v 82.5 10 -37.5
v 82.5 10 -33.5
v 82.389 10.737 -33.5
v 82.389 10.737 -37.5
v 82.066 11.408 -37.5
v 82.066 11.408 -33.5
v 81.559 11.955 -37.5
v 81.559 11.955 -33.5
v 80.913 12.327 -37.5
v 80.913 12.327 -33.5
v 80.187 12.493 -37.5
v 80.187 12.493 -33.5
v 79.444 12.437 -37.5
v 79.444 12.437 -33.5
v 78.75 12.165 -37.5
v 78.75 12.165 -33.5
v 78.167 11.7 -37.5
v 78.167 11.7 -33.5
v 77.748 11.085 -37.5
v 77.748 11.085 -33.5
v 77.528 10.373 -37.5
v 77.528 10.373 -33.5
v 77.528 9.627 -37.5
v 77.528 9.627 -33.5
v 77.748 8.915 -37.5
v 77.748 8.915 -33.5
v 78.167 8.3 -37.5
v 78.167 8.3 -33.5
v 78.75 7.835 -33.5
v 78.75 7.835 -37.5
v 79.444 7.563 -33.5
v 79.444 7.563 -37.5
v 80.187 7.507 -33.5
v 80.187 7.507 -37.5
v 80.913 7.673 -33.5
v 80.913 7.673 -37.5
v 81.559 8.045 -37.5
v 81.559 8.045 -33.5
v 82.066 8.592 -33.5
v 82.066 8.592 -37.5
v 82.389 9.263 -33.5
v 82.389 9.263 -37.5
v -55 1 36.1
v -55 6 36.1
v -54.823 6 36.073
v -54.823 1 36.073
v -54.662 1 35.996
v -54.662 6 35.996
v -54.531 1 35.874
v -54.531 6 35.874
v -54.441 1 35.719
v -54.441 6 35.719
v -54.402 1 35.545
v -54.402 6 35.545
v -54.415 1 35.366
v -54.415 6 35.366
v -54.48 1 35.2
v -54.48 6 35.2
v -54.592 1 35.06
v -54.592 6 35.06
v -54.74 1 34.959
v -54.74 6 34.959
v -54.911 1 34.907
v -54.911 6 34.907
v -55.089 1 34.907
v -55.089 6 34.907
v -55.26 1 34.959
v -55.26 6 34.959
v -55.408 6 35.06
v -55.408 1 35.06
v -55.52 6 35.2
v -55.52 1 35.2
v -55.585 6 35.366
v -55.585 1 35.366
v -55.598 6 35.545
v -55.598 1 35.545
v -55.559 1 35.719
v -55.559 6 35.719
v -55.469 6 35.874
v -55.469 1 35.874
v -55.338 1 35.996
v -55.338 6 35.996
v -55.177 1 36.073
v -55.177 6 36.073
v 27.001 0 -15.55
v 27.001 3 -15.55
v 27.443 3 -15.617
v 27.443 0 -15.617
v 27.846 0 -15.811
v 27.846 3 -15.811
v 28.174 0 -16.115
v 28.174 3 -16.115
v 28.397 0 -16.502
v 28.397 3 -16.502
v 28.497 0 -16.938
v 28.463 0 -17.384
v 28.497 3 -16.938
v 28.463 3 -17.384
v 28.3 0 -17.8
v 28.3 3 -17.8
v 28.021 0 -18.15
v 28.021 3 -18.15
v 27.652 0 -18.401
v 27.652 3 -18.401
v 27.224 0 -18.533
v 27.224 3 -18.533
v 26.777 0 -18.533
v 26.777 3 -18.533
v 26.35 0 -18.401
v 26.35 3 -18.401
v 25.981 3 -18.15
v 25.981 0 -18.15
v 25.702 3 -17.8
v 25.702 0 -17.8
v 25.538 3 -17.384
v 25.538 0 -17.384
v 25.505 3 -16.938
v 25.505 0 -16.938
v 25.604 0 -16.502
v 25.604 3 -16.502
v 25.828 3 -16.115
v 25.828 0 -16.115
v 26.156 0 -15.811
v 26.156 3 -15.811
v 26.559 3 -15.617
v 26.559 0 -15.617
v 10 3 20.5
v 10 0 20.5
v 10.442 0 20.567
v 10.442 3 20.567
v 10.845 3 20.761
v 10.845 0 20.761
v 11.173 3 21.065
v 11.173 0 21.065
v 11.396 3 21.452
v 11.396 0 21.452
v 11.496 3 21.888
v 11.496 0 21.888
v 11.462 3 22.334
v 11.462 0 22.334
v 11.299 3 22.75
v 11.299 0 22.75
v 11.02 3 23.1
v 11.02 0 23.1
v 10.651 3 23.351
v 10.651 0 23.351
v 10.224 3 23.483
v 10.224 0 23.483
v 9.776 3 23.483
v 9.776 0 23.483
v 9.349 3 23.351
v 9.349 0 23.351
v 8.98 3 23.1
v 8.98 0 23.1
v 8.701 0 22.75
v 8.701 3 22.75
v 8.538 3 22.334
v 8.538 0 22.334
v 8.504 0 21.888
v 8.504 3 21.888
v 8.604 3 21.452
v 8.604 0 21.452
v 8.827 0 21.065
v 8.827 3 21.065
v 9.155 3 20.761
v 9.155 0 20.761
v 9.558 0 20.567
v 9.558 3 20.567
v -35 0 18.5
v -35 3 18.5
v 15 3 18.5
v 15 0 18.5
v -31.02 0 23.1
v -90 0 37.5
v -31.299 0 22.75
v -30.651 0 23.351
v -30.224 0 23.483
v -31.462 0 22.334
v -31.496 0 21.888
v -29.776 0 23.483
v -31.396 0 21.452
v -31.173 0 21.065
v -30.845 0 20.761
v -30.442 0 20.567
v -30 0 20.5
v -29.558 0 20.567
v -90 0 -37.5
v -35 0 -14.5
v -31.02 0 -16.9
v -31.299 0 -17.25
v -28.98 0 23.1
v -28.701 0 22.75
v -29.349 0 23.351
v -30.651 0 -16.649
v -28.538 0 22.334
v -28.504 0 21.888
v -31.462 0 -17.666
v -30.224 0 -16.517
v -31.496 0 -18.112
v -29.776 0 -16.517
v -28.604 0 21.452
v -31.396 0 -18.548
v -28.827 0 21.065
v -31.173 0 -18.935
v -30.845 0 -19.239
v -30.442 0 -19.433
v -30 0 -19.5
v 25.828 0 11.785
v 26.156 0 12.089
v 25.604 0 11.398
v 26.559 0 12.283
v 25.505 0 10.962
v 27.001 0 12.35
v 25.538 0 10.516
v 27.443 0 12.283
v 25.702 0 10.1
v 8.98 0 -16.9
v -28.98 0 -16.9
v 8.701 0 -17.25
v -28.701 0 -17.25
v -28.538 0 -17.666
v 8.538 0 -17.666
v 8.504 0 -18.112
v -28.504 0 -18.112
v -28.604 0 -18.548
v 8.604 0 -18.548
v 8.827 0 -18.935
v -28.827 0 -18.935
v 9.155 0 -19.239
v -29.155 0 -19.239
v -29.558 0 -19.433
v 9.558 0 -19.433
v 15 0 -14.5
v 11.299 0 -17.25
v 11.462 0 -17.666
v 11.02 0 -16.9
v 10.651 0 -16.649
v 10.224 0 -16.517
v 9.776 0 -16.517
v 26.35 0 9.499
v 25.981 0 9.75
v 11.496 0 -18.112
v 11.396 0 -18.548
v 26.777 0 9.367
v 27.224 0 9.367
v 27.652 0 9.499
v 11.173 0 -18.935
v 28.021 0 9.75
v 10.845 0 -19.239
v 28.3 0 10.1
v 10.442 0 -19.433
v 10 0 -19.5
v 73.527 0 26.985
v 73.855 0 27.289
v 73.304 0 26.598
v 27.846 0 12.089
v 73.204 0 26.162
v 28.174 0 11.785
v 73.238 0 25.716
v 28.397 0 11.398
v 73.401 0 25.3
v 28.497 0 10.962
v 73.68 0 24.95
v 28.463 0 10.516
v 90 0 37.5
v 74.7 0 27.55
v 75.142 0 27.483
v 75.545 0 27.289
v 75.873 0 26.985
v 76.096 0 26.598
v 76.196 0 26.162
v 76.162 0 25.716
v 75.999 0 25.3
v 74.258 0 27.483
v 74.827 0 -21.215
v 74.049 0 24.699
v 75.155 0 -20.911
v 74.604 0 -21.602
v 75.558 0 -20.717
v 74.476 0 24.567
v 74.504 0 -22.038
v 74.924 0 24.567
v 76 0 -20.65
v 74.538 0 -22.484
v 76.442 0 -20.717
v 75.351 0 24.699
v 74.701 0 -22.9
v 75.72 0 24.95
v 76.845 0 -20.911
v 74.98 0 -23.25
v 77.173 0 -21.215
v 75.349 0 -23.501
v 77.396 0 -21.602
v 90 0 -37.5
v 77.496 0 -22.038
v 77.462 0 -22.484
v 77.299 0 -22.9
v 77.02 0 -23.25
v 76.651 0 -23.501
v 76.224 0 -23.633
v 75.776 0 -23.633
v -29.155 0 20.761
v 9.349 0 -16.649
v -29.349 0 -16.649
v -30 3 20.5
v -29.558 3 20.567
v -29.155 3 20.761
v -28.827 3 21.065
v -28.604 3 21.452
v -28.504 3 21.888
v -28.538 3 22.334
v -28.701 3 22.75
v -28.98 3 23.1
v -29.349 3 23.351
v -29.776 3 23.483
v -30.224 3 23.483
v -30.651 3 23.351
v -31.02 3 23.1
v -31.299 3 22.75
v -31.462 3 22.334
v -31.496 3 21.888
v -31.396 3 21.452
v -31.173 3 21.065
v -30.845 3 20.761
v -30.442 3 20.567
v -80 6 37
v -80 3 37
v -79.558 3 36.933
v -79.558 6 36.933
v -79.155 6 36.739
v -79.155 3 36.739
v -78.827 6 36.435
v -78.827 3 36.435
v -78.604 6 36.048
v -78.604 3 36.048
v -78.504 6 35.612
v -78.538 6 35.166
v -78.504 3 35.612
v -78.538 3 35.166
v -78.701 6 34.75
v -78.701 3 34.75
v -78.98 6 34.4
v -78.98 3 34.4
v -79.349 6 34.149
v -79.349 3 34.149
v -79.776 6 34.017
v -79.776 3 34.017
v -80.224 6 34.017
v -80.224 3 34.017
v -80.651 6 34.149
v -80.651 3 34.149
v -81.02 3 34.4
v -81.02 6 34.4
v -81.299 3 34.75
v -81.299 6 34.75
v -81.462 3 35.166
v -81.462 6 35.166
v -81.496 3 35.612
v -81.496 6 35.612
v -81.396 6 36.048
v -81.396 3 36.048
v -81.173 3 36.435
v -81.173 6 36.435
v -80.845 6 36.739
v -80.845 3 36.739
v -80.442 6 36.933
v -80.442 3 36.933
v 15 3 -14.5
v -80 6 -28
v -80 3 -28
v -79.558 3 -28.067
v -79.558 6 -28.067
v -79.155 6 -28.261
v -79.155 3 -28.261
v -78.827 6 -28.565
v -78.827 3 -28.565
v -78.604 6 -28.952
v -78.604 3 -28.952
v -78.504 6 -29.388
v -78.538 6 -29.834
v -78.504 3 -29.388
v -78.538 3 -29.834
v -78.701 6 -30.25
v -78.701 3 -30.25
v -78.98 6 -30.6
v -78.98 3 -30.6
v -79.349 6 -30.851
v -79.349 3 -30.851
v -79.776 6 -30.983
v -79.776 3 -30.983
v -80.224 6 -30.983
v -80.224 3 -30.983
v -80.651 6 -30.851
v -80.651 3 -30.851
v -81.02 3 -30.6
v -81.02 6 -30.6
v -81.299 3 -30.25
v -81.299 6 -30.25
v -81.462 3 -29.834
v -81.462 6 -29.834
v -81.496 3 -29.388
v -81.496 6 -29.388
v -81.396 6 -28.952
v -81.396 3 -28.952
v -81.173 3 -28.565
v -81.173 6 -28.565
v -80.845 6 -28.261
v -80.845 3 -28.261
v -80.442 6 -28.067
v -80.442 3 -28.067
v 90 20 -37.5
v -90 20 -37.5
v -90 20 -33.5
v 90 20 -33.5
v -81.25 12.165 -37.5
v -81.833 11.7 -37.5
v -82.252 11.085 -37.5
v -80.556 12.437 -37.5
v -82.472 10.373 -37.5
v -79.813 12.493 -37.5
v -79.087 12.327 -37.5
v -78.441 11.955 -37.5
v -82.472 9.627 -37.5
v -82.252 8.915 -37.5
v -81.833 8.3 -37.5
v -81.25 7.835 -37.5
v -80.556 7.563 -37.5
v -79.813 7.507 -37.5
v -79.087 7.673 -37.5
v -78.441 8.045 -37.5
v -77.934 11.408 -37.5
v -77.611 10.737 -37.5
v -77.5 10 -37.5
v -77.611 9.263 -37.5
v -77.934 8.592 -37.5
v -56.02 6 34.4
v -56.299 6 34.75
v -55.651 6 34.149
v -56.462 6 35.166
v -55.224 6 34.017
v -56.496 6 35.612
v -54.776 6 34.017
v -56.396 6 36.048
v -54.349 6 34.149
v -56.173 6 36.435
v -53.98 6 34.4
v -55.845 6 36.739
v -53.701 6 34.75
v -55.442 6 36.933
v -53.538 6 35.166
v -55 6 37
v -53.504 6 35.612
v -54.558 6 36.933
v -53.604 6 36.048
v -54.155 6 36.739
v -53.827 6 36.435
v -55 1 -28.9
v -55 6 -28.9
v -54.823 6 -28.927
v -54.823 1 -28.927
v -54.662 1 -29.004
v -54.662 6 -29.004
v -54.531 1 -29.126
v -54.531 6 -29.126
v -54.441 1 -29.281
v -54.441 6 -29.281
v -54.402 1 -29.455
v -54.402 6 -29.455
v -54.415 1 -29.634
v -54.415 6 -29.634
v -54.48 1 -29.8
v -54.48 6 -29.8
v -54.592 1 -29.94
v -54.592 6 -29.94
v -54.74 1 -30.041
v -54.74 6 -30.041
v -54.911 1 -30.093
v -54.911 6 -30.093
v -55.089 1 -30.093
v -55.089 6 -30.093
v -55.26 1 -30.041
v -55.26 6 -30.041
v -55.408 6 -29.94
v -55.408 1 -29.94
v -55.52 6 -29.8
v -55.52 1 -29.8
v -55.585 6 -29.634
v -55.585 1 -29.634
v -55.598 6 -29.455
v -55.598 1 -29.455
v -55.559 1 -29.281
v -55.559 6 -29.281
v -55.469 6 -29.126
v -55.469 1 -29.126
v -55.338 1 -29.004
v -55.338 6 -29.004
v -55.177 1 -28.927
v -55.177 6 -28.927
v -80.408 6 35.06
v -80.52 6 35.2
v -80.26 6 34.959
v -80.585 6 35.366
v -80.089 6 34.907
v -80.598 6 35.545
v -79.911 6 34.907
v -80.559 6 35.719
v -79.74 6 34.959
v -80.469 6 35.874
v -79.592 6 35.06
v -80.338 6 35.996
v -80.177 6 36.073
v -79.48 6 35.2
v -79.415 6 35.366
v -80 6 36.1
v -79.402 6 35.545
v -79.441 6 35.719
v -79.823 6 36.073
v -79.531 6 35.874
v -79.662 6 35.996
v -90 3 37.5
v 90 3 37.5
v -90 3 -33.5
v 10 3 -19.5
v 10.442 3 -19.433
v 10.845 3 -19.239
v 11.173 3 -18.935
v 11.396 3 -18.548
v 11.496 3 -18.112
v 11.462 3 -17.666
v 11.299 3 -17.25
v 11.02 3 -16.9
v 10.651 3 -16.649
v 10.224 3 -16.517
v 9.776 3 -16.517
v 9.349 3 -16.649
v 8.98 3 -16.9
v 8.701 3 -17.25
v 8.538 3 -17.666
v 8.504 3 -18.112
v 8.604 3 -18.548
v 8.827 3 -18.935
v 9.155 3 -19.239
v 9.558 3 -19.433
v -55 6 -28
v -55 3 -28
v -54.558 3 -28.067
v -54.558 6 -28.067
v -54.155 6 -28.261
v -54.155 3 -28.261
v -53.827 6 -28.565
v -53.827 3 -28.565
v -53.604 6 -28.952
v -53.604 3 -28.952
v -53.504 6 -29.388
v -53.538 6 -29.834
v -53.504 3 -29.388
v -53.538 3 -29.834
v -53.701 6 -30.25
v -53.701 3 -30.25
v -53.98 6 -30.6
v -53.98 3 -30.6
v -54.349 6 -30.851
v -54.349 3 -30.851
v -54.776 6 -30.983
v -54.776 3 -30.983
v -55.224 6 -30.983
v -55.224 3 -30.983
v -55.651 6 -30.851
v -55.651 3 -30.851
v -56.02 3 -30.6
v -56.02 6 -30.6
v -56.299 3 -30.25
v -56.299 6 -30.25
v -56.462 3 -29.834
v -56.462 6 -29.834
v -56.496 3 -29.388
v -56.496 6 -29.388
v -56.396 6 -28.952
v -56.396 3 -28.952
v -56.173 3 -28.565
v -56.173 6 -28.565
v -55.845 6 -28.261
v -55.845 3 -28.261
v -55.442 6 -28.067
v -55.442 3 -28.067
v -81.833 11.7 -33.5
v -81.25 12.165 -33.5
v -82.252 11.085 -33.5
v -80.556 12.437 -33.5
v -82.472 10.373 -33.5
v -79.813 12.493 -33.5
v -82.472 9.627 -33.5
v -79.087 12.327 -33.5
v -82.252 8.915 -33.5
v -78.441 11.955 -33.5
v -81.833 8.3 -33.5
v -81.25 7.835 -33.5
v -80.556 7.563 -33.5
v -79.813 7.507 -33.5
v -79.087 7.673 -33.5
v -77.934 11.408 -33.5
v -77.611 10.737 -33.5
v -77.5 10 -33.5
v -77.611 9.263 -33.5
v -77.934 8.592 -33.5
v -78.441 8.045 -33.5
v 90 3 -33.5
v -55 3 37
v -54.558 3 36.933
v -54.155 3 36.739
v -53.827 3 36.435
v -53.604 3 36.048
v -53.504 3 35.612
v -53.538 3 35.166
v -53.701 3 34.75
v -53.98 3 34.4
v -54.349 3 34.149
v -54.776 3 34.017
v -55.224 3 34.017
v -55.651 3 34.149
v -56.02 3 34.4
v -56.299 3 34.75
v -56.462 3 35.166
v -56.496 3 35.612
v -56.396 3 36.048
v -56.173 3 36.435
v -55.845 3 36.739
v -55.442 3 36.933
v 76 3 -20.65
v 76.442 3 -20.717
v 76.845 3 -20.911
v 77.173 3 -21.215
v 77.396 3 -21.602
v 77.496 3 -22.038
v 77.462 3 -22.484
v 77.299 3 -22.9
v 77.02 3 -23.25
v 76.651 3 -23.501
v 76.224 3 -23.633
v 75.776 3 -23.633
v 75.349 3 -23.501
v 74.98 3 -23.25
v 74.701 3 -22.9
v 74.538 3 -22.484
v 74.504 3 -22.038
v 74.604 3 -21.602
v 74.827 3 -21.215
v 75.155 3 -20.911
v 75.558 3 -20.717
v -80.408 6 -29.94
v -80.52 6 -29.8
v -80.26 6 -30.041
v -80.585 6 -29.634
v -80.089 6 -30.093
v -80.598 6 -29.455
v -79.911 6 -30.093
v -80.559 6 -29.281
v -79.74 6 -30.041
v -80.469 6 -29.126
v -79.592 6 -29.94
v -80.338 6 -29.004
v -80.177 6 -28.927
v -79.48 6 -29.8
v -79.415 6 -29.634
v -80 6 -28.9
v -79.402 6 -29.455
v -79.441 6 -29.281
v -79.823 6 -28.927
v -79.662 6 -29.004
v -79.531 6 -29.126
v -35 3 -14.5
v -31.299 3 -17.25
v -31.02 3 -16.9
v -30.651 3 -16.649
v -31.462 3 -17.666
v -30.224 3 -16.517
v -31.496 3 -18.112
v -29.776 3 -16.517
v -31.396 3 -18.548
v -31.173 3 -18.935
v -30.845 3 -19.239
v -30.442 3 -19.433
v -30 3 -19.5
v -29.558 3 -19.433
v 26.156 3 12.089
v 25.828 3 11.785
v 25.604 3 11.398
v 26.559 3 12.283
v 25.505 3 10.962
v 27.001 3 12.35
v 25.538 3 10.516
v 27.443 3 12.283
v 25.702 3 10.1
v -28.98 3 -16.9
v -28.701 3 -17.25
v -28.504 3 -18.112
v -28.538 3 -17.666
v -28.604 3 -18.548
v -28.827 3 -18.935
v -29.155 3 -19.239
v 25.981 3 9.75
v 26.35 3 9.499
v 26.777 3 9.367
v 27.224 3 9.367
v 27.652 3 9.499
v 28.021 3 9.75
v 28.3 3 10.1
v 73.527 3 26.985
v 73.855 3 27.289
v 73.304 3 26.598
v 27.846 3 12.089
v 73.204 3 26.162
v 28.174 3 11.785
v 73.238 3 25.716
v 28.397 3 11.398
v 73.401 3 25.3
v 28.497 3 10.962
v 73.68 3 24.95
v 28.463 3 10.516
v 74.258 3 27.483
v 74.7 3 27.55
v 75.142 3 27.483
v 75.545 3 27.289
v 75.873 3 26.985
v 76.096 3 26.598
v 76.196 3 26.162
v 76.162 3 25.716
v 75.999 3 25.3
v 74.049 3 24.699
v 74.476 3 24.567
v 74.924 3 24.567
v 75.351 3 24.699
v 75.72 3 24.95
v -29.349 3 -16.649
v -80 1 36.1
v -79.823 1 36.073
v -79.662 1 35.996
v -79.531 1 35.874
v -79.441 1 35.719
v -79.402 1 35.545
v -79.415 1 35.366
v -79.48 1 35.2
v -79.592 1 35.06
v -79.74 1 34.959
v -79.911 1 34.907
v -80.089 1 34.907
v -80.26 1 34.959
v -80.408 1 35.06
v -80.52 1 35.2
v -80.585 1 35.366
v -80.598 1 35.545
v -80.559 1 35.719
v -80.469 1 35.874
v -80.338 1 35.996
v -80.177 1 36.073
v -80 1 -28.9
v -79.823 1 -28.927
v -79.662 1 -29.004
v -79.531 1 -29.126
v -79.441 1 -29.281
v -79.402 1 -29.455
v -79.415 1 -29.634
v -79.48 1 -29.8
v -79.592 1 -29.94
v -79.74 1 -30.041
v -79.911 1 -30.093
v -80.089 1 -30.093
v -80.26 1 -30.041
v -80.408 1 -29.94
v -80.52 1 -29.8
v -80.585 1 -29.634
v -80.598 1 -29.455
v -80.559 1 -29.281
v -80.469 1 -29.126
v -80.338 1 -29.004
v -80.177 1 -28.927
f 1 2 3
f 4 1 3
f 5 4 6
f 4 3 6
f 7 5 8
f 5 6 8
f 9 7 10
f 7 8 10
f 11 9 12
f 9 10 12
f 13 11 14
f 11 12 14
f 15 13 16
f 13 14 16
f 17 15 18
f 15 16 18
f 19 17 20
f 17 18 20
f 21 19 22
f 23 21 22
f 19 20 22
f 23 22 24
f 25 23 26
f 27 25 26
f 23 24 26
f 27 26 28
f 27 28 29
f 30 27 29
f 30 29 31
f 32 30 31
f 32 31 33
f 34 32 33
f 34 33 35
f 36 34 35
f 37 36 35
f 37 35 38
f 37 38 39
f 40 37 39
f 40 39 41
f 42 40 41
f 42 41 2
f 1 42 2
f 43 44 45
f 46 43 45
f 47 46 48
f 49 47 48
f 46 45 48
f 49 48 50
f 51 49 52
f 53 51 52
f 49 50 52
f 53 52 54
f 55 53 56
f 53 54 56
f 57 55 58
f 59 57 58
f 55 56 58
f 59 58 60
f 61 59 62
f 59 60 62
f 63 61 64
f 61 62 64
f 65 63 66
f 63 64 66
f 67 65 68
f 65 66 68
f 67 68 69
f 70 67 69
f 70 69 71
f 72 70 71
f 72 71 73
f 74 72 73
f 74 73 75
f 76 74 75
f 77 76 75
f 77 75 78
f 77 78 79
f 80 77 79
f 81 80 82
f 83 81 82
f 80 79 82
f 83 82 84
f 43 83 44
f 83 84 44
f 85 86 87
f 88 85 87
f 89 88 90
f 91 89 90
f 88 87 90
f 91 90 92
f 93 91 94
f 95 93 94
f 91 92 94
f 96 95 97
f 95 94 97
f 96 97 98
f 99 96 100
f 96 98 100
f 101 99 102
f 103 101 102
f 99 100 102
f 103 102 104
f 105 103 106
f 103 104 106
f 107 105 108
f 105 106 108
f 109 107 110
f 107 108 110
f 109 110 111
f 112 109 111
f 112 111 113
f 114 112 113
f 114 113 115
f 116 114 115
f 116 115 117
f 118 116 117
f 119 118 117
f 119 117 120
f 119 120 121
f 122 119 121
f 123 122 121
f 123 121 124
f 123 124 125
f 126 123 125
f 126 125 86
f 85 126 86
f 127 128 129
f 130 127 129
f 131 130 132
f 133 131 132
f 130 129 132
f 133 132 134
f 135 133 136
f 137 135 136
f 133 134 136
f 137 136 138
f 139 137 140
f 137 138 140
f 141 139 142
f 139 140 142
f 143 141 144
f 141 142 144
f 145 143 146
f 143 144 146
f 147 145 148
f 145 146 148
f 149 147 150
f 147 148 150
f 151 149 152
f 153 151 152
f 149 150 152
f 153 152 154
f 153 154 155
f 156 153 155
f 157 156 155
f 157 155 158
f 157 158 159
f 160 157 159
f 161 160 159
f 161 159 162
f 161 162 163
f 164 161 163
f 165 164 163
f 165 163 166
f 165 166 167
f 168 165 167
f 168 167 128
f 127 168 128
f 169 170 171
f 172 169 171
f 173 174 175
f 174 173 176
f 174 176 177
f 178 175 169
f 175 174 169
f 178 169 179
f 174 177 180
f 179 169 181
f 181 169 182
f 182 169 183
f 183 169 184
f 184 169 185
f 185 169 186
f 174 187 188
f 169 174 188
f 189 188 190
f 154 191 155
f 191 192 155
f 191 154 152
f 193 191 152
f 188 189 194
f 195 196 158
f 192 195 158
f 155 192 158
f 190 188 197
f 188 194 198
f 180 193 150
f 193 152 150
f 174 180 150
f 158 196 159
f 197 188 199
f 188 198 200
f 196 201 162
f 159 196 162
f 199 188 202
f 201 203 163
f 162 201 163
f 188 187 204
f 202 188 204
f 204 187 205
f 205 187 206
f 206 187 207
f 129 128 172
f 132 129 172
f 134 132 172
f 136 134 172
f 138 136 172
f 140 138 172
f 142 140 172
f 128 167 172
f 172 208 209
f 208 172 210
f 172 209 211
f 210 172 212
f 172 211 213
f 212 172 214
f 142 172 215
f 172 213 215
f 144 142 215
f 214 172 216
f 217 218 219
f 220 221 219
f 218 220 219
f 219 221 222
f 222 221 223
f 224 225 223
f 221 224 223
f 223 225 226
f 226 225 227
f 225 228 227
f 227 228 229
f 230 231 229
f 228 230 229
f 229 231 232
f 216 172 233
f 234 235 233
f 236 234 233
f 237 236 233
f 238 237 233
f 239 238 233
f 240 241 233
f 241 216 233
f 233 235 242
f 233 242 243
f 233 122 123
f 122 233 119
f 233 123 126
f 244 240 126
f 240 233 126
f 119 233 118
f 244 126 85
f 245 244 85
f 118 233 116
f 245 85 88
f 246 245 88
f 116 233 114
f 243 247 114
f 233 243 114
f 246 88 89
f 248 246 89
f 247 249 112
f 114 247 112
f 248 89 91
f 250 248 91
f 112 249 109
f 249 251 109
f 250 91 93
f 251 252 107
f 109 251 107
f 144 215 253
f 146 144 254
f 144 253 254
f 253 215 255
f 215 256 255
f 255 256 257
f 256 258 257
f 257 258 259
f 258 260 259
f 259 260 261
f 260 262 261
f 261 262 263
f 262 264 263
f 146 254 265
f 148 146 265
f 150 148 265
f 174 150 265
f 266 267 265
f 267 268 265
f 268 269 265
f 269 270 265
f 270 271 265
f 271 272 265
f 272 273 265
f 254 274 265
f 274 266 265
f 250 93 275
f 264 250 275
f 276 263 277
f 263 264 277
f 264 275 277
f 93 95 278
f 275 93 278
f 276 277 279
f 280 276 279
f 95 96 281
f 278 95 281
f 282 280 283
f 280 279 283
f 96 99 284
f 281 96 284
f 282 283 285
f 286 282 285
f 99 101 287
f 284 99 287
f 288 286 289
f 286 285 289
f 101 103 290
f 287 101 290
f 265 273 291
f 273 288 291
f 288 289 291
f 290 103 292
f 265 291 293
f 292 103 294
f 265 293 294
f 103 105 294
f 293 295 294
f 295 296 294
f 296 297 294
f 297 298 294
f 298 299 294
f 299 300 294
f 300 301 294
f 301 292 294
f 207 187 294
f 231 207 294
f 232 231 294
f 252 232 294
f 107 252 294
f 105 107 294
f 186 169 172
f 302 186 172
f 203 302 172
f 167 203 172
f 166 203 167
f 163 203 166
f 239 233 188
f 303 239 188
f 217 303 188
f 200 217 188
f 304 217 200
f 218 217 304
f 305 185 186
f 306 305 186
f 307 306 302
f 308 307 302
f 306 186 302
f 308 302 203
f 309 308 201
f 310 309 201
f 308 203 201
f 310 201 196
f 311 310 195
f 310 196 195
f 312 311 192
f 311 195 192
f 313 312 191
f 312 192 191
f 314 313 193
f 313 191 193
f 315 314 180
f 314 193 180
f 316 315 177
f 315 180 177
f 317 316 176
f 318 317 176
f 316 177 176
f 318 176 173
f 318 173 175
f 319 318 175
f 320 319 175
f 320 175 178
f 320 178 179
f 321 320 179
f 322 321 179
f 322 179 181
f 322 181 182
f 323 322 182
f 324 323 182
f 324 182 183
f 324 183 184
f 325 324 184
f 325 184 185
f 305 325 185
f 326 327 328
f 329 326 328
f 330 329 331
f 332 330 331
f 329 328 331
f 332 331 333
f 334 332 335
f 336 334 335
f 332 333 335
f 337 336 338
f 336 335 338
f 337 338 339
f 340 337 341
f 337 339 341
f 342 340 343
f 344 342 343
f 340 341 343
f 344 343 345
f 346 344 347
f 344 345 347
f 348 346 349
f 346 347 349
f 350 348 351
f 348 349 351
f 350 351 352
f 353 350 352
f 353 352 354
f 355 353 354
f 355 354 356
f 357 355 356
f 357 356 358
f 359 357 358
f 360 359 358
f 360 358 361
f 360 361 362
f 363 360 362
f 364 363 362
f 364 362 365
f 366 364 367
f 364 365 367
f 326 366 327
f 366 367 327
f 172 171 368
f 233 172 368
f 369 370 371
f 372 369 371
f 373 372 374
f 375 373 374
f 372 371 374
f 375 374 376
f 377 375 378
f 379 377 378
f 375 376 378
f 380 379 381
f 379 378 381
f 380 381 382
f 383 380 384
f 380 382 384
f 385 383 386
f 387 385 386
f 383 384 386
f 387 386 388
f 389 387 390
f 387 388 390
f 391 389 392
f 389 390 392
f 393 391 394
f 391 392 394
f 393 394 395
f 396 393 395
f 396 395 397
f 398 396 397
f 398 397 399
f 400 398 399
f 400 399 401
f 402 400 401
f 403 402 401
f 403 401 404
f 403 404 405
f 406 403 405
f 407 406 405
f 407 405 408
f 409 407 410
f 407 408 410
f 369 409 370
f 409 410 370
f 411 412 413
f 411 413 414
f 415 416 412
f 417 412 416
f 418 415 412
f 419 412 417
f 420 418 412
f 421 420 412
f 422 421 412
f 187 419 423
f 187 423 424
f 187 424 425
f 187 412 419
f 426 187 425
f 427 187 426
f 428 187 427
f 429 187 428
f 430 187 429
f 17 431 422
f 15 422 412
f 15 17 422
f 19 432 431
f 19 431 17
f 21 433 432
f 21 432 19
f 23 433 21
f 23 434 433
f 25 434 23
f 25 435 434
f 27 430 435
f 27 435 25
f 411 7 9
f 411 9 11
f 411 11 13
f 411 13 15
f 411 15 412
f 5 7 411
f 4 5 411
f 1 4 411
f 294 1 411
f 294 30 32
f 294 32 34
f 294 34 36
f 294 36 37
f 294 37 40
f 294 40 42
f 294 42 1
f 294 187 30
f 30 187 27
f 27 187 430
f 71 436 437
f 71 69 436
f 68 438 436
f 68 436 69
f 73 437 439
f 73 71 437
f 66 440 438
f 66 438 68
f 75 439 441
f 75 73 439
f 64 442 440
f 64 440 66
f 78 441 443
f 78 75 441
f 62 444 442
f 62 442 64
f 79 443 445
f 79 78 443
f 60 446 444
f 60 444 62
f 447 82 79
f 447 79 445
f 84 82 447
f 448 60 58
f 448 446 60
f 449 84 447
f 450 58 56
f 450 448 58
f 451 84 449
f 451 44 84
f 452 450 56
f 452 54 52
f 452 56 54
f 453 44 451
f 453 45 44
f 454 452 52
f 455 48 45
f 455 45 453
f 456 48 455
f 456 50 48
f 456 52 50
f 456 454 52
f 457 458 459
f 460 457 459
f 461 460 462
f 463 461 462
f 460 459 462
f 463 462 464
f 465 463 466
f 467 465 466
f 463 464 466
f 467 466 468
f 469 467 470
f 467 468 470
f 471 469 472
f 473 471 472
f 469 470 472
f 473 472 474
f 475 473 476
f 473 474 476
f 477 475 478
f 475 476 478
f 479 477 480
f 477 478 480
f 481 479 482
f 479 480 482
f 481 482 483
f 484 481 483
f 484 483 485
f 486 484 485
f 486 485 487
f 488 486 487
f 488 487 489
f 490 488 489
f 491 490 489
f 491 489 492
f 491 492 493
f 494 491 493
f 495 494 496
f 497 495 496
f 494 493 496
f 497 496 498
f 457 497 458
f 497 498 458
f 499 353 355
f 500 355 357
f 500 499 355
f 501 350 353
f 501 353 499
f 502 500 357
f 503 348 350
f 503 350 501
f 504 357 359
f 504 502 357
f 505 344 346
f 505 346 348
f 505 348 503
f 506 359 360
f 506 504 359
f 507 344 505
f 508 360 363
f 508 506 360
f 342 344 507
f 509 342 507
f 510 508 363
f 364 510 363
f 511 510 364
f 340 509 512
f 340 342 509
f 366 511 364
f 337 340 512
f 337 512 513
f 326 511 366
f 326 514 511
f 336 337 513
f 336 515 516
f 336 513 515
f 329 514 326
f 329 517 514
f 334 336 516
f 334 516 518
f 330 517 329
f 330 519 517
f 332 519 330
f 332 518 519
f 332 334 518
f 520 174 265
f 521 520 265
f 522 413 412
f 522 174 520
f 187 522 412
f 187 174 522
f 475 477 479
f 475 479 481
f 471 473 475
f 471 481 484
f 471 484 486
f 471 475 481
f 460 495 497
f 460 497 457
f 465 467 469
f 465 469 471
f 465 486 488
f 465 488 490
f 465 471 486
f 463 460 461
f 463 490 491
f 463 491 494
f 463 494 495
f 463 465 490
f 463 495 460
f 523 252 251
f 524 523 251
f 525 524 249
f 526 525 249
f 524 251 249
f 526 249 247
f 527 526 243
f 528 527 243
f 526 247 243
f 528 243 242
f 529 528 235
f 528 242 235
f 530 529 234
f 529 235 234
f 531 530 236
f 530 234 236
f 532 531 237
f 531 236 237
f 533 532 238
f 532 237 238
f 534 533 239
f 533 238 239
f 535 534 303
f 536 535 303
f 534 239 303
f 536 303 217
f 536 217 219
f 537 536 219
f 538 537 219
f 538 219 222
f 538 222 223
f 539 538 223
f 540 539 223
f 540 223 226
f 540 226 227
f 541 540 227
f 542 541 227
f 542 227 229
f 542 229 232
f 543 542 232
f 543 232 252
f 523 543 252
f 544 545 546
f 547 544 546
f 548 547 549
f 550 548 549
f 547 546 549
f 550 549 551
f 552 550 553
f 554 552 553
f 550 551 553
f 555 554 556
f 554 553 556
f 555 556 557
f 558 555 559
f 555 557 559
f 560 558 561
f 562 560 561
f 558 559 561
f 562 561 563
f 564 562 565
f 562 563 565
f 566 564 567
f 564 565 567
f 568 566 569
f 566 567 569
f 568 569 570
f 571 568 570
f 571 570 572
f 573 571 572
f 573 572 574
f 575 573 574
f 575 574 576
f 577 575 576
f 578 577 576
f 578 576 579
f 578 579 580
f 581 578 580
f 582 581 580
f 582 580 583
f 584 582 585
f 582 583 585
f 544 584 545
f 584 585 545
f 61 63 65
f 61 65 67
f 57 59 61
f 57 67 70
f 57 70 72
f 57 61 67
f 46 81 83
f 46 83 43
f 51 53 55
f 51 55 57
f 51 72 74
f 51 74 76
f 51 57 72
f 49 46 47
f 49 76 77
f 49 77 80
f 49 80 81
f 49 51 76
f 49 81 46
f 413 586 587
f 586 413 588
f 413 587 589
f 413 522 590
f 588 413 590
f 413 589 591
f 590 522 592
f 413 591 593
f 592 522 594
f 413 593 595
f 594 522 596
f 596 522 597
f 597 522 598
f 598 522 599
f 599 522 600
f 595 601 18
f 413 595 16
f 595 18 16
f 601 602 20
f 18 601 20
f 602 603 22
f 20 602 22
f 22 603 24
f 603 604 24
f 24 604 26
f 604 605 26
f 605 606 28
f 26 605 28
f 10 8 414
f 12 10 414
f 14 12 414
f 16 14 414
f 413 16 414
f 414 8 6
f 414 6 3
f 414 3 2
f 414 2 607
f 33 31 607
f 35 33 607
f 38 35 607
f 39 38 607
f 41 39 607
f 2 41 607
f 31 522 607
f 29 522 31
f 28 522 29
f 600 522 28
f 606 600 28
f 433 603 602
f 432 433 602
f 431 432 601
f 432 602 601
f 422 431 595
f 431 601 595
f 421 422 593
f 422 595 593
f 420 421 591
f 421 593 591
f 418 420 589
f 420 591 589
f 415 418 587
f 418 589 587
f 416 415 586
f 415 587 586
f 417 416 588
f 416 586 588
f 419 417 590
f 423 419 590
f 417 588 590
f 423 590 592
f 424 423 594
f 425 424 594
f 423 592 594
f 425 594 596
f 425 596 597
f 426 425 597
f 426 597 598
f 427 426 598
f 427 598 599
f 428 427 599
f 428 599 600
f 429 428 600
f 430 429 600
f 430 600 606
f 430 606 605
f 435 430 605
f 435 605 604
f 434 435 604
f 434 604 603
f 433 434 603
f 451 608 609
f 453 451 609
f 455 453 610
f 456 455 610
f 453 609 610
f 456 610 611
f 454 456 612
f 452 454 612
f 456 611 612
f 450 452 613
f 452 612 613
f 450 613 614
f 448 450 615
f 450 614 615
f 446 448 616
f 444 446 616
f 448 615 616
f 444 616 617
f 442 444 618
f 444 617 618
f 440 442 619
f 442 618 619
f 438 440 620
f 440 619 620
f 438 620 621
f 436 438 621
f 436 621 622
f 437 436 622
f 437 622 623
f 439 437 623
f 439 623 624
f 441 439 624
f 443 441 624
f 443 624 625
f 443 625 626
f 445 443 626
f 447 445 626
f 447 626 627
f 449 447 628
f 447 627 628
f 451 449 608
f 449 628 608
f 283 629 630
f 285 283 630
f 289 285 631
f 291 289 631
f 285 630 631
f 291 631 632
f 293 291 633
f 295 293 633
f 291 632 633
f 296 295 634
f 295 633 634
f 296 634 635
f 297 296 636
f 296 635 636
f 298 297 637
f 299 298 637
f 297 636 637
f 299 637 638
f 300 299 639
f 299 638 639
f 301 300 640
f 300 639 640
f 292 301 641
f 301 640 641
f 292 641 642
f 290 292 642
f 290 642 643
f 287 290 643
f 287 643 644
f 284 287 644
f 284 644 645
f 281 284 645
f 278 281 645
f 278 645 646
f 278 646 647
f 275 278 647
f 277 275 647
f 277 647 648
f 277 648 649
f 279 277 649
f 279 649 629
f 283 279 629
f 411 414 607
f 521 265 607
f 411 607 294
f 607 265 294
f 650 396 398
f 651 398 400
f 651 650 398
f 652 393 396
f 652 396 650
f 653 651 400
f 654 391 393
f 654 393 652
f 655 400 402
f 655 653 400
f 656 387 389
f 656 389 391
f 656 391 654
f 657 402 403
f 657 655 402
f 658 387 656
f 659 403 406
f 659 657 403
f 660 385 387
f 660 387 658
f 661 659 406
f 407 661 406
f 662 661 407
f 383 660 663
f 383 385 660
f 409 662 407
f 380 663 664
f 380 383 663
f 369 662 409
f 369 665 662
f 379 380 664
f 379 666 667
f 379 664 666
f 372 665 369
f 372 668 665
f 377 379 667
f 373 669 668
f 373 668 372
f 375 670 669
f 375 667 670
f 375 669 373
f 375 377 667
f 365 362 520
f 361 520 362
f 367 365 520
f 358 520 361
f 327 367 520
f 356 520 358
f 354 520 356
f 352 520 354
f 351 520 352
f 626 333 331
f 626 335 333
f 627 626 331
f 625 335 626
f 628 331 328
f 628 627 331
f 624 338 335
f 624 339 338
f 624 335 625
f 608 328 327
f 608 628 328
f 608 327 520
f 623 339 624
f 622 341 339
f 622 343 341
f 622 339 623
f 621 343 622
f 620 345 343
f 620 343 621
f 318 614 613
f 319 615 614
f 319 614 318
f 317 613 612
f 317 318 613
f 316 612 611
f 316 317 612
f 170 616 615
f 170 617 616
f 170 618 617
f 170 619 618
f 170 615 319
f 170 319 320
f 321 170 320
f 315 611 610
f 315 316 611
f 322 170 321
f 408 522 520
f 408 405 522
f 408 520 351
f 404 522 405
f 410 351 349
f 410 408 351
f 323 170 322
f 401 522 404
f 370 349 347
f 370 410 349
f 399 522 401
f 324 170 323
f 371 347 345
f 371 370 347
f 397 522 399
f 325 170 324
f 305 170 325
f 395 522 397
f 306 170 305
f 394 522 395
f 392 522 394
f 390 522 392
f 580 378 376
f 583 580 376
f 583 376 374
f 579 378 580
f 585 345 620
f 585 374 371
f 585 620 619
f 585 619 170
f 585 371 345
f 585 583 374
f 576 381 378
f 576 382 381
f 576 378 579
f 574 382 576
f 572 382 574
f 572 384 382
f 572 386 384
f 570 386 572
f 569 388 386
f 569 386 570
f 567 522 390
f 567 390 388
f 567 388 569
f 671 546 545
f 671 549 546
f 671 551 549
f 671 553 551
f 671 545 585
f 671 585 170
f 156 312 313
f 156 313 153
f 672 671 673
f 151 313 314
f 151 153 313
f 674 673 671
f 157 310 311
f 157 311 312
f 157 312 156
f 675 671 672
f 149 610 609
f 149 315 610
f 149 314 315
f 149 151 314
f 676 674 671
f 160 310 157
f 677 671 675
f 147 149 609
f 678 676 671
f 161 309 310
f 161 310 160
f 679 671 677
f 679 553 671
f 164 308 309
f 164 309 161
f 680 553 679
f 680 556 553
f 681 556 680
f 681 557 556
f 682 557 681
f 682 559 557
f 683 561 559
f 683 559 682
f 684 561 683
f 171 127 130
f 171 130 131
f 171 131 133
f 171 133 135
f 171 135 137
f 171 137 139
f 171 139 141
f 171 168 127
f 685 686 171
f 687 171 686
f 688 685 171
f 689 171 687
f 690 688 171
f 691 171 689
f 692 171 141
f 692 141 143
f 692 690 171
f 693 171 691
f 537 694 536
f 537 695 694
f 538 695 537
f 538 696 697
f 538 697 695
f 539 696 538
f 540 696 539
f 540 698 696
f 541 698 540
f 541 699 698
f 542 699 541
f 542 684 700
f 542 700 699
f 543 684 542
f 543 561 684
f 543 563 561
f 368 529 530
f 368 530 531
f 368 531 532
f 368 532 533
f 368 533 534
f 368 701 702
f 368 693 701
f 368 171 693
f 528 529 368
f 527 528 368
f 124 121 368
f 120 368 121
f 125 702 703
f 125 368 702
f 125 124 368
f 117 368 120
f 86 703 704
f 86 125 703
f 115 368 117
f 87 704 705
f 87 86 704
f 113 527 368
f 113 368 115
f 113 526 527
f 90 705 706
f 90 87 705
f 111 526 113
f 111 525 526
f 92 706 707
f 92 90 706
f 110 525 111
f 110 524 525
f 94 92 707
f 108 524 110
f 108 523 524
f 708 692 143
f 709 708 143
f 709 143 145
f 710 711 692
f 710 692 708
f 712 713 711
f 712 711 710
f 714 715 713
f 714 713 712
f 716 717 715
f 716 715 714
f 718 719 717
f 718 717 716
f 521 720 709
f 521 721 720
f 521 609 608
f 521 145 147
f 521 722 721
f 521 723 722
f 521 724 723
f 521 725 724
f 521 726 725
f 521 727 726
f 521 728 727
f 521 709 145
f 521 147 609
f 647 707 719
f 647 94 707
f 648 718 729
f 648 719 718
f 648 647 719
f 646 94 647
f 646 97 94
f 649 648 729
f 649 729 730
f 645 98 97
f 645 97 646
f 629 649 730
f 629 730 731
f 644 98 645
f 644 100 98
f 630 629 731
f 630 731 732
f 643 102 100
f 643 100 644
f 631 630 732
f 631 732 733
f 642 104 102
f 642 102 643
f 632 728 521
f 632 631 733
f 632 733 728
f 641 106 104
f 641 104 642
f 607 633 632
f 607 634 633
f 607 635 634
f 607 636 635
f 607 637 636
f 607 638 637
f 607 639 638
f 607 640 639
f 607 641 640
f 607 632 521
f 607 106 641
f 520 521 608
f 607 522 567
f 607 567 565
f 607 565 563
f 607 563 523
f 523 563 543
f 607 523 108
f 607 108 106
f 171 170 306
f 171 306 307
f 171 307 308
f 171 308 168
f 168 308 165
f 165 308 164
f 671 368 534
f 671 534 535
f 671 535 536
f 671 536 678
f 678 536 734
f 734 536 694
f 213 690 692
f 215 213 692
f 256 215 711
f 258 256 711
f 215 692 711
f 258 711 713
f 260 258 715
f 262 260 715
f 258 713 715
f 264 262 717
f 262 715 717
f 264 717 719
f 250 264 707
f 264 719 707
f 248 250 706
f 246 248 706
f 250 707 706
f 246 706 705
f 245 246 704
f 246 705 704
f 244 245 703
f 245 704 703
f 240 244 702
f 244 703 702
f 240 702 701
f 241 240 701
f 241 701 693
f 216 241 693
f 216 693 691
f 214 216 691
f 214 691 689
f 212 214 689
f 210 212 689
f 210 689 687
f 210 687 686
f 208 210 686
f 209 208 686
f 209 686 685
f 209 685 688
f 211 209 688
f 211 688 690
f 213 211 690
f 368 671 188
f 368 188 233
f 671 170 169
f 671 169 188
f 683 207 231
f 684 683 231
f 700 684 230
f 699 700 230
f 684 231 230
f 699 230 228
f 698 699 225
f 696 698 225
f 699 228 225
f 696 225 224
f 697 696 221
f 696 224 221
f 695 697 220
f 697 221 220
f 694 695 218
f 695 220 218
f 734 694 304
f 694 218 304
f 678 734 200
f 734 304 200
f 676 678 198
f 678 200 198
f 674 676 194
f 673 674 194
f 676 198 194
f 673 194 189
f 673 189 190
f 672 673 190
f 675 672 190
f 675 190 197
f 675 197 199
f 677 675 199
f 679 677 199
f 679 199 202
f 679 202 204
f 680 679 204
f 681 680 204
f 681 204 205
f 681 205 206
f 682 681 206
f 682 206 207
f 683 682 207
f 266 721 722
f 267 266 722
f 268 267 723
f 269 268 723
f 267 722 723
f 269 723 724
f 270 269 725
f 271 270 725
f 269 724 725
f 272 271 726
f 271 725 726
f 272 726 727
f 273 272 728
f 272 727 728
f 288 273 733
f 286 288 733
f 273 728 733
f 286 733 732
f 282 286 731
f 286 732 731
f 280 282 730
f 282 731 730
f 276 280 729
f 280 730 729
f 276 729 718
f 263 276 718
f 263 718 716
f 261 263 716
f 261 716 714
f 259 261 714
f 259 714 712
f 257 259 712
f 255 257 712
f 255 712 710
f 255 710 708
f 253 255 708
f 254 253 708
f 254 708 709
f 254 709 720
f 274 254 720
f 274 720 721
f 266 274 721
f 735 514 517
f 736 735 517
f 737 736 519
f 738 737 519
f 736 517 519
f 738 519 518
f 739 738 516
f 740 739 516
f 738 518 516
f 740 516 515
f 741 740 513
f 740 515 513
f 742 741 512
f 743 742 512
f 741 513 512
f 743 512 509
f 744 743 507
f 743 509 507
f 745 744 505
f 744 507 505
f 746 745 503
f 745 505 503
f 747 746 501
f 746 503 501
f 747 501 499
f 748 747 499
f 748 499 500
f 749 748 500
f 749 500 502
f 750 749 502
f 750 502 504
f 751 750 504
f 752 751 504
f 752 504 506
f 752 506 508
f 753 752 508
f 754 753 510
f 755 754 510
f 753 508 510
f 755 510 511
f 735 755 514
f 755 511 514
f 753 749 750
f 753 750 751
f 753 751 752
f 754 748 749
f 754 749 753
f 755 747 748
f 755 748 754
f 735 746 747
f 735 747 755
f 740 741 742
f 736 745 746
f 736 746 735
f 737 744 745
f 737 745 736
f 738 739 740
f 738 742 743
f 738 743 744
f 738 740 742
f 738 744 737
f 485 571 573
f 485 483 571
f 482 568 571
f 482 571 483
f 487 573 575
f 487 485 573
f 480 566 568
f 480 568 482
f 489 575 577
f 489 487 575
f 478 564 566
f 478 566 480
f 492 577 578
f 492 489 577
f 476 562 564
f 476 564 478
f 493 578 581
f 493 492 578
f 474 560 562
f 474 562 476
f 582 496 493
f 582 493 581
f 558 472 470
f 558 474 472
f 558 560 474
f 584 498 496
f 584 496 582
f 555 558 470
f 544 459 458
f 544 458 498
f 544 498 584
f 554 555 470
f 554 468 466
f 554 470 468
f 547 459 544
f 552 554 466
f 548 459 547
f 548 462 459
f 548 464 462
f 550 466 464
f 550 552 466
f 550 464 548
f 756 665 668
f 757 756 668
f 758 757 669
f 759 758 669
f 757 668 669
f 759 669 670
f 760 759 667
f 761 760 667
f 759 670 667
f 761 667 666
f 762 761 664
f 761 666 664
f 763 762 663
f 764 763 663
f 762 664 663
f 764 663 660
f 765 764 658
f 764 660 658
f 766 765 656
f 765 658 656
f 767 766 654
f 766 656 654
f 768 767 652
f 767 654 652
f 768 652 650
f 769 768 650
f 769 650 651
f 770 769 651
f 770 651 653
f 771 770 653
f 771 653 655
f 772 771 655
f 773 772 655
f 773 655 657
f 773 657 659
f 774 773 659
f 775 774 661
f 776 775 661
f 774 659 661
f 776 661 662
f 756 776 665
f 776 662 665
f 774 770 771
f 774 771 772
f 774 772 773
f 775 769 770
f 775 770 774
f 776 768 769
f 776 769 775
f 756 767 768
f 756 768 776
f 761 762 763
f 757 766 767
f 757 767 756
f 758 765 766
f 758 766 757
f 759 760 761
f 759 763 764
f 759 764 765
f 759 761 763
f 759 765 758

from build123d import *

# Parameters (mm, degrees)
SKETCH1_W             = 180
SKETCH1_H             = 75
BOSS_EXTRUDE1_DEPTH   = 3
SKETCH2_W             = 180
SKETCH2_H             = 4
BOSS_EXTRUDE2_DEPTH   = 17
SKETCH3_R             = 1.5
BOSS_EXTRUDE3_DEPTH   = 3
SKETCH4_R             = 0.6
CUT_EXTRUDE1_DEPTH    = 5
SKETCH5_W             = 50
SKETCH5_H             = 33
CUT_EXTRUDE2_DEPTH    = 5
F_3_0MM_DOWEL_HOLE1_D = 3
CUT_EXTRUDE3_REACH    = 100.971
SKETCH8_R             = 1.5
CUT_EXTRUDE4_REACH    = 118.366
SKETCH9_R             = 2.5


with BuildPart() as part:
    # Sketch1 → Boss-Extrude1 (new body)
    with BuildSketch(Plane(origin=(0, 0, 0), x_dir=(1, 0, 0), z_dir=(0, 1, 0))):
        Rectangle(SKETCH1_W, SKETCH1_H)
    extrude(amount=BOSS_EXTRUDE1_DEPTH)

    # Sketch2 → Boss-Extrude2 (add)
    with BuildSketch(Plane(origin=(0, 3, 0), x_dir=(1, 0, 0), z_dir=(0, 1, 0))):
        with Locations((0, 35.5)):
            Rectangle(SKETCH2_W, SKETCH2_H)
    extrude(amount=BOSS_EXTRUDE2_DEPTH)

    # Sketch3 → Boss-Extrude3 (add)
    with BuildSketch(Plane(origin=(0, 3, 0), x_dir=(1, 0, 0), z_dir=(0, 1, 0))):
        with Locations(Location((-80, 29.5, 0), (0, 0, 270))):
            Circle(SKETCH3_R)
        with Locations(Location((-55, 29.5, 0), (0, 0, 270))):
            Circle(SKETCH3_R)
        with Locations(Location((-55, -35.5, 0), (0, 0, 270))):
            Circle(SKETCH3_R)
        with Locations(Location((-80, -35.5, 0), (0, 0, 270))):
            Circle(SKETCH3_R)
    extrude(amount=BOSS_EXTRUDE3_DEPTH)

    # Sketch4 → Cut-Extrude1 (cut)
    with BuildSketch(Plane(origin=(0, 6, 0), x_dir=(1, 0, 0), z_dir=(0, 1, 0))):
        with Locations(Location((-80, 29.5, 0), (0, 0, 270))):
            Circle(SKETCH4_R)
        with Locations(Location((-55, 29.5, 0), (0, 0, 270))):
            Circle(SKETCH4_R)
        with Locations(Location((-55, -35.5, 0), (0, 0, 270))):
            Circle(SKETCH4_R)
        with Locations(Location((-80, -35.5, 0), (0, 0, 270))):
            Circle(SKETCH4_R)
    extrude(amount=-CUT_EXTRUDE1_DEPTH, mode=Mode.SUBTRACT)

    # Sketch5 → Cut-Extrude2 (cut)
    with BuildSketch(Plane(origin=(0, 3, 0), x_dir=(1, 0, 0), z_dir=(0, 1, 0))):
        with Locations((-10, -2)):
            Rectangle(SKETCH5_W, SKETCH5_H)
    extrude(amount=-CUT_EXTRUDE2_DEPTH, mode=Mode.SUBTRACT)

    # Ø3.0mm Dowel Hole1 (through all)
    with Locations(Plane(origin=(-30, 3, -18), x_dir=(0, 0, 1), z_dir=(0, 1, 0))):
        with Locations((0, 0), (0, 40), (40, 40), (40, 0)):
            Hole(F_3_0MM_DOWEL_HOLE1_D / 2)

    # Sketch8 → Cut-Extrude3 (cut, up to next)
    with BuildSketch(Plane(origin=(0, 3, 0), x_dir=(1, 0, 0), z_dir=(0, 1, 0)), mode=Mode.PRIVATE) as cut_extrude3_sk1:
        with Locations(Location((76, 22.15, 0), (0, 0, 270))):
            Circle(SKETCH8_R)
    cut_extrude3_tool1 = extrude(cut_extrude3_sk1.sketch, amount=-CUT_EXTRUDE3_REACH, mode=Mode.PRIVATE) & part.part
    # Sketch8 → Cut-Extrude3 (cut, up to next)
    with BuildSketch(Plane(origin=(0, 3, 0), x_dir=(1, 0, 0), z_dir=(0, 1, 0)), mode=Mode.PRIVATE) as cut_extrude3_sk2:
        with Locations(Location((74.7, -26.05, 0), (0, 0, 270))):
            Circle(SKETCH8_R)
    cut_extrude3_tool2 = extrude(cut_extrude3_sk2.sketch, amount=-CUT_EXTRUDE3_REACH, mode=Mode.PRIVATE) & part.part
    # Sketch8 → Cut-Extrude3 (cut, up to next)
    with BuildSketch(Plane(origin=(0, 3, 0), x_dir=(1, 0, 0), z_dir=(0, 1, 0)), mode=Mode.PRIVATE) as cut_extrude3_sk3:
        with Locations(Location((27.000808713, -10.85, 0), (0, 0, 270))):
            Circle(SKETCH8_R)
    cut_extrude3_tool3 = extrude(cut_extrude3_sk3.sketch, amount=-CUT_EXTRUDE3_REACH, mode=Mode.PRIVATE) & part.part
    # Sketch8 → Cut-Extrude3 (cut, up to next)
    with BuildSketch(Plane(origin=(0, 3, 0), x_dir=(1, 0, 0), z_dir=(0, 1, 0)), mode=Mode.PRIVATE) as cut_extrude3_sk4:
        with Locations(Location((27.000808713, 17.05, 0), (0, 0, 270))):
            Circle(SKETCH8_R)
    cut_extrude3_tool4 = extrude(cut_extrude3_sk4.sketch, amount=-CUT_EXTRUDE3_REACH, mode=Mode.PRIVATE) & part.part
    add(cut_extrude3_tool1.solids().sort_by_distance((76, 3, -22.15))[0], mode=Mode.SUBTRACT)
    add(cut_extrude3_tool2.solids().sort_by_distance((74.7, 3, 26.05))[0], mode=Mode.SUBTRACT)
    add(cut_extrude3_tool3.solids().sort_by_distance((27.000809, 3, 10.85))[0], mode=Mode.SUBTRACT)
    add(cut_extrude3_tool4.solids().sort_by_distance((27.000809, 3, -17.05))[0], mode=Mode.SUBTRACT)

    # Sketch9 → Cut-Extrude4 (cut, up to next)
    with BuildSketch(Plane.XY.offset(-33.5), mode=Mode.PRIVATE) as cut_extrude4_sk1:
        with Locations((-80, 10)):
            Circle(SKETCH9_R)
    cut_extrude4_tool1 = extrude(cut_extrude4_sk1.sketch, amount=-CUT_EXTRUDE4_REACH, mode=Mode.PRIVATE) & part.part
    # Sketch9 → Cut-Extrude4 (cut, up to next)
    with BuildSketch(Plane.XY.offset(-33.5), mode=Mode.PRIVATE) as cut_extrude4_sk2:
        with Locations((80, 10)):
            Circle(SKETCH9_R)
    cut_extrude4_tool2 = extrude(cut_extrude4_sk2.sketch, amount=-CUT_EXTRUDE4_REACH, mode=Mode.PRIVATE) & part.part
    add(cut_extrude4_tool1.solids().sort_by_distance((-80, 10, -33.5))[0], mode=Mode.SUBTRACT)
    add(cut_extrude4_tool2.solids().sort_by_distance((80, 10, -33.5))[0], mode=Mode.SUBTRACT)


solid = part.part
